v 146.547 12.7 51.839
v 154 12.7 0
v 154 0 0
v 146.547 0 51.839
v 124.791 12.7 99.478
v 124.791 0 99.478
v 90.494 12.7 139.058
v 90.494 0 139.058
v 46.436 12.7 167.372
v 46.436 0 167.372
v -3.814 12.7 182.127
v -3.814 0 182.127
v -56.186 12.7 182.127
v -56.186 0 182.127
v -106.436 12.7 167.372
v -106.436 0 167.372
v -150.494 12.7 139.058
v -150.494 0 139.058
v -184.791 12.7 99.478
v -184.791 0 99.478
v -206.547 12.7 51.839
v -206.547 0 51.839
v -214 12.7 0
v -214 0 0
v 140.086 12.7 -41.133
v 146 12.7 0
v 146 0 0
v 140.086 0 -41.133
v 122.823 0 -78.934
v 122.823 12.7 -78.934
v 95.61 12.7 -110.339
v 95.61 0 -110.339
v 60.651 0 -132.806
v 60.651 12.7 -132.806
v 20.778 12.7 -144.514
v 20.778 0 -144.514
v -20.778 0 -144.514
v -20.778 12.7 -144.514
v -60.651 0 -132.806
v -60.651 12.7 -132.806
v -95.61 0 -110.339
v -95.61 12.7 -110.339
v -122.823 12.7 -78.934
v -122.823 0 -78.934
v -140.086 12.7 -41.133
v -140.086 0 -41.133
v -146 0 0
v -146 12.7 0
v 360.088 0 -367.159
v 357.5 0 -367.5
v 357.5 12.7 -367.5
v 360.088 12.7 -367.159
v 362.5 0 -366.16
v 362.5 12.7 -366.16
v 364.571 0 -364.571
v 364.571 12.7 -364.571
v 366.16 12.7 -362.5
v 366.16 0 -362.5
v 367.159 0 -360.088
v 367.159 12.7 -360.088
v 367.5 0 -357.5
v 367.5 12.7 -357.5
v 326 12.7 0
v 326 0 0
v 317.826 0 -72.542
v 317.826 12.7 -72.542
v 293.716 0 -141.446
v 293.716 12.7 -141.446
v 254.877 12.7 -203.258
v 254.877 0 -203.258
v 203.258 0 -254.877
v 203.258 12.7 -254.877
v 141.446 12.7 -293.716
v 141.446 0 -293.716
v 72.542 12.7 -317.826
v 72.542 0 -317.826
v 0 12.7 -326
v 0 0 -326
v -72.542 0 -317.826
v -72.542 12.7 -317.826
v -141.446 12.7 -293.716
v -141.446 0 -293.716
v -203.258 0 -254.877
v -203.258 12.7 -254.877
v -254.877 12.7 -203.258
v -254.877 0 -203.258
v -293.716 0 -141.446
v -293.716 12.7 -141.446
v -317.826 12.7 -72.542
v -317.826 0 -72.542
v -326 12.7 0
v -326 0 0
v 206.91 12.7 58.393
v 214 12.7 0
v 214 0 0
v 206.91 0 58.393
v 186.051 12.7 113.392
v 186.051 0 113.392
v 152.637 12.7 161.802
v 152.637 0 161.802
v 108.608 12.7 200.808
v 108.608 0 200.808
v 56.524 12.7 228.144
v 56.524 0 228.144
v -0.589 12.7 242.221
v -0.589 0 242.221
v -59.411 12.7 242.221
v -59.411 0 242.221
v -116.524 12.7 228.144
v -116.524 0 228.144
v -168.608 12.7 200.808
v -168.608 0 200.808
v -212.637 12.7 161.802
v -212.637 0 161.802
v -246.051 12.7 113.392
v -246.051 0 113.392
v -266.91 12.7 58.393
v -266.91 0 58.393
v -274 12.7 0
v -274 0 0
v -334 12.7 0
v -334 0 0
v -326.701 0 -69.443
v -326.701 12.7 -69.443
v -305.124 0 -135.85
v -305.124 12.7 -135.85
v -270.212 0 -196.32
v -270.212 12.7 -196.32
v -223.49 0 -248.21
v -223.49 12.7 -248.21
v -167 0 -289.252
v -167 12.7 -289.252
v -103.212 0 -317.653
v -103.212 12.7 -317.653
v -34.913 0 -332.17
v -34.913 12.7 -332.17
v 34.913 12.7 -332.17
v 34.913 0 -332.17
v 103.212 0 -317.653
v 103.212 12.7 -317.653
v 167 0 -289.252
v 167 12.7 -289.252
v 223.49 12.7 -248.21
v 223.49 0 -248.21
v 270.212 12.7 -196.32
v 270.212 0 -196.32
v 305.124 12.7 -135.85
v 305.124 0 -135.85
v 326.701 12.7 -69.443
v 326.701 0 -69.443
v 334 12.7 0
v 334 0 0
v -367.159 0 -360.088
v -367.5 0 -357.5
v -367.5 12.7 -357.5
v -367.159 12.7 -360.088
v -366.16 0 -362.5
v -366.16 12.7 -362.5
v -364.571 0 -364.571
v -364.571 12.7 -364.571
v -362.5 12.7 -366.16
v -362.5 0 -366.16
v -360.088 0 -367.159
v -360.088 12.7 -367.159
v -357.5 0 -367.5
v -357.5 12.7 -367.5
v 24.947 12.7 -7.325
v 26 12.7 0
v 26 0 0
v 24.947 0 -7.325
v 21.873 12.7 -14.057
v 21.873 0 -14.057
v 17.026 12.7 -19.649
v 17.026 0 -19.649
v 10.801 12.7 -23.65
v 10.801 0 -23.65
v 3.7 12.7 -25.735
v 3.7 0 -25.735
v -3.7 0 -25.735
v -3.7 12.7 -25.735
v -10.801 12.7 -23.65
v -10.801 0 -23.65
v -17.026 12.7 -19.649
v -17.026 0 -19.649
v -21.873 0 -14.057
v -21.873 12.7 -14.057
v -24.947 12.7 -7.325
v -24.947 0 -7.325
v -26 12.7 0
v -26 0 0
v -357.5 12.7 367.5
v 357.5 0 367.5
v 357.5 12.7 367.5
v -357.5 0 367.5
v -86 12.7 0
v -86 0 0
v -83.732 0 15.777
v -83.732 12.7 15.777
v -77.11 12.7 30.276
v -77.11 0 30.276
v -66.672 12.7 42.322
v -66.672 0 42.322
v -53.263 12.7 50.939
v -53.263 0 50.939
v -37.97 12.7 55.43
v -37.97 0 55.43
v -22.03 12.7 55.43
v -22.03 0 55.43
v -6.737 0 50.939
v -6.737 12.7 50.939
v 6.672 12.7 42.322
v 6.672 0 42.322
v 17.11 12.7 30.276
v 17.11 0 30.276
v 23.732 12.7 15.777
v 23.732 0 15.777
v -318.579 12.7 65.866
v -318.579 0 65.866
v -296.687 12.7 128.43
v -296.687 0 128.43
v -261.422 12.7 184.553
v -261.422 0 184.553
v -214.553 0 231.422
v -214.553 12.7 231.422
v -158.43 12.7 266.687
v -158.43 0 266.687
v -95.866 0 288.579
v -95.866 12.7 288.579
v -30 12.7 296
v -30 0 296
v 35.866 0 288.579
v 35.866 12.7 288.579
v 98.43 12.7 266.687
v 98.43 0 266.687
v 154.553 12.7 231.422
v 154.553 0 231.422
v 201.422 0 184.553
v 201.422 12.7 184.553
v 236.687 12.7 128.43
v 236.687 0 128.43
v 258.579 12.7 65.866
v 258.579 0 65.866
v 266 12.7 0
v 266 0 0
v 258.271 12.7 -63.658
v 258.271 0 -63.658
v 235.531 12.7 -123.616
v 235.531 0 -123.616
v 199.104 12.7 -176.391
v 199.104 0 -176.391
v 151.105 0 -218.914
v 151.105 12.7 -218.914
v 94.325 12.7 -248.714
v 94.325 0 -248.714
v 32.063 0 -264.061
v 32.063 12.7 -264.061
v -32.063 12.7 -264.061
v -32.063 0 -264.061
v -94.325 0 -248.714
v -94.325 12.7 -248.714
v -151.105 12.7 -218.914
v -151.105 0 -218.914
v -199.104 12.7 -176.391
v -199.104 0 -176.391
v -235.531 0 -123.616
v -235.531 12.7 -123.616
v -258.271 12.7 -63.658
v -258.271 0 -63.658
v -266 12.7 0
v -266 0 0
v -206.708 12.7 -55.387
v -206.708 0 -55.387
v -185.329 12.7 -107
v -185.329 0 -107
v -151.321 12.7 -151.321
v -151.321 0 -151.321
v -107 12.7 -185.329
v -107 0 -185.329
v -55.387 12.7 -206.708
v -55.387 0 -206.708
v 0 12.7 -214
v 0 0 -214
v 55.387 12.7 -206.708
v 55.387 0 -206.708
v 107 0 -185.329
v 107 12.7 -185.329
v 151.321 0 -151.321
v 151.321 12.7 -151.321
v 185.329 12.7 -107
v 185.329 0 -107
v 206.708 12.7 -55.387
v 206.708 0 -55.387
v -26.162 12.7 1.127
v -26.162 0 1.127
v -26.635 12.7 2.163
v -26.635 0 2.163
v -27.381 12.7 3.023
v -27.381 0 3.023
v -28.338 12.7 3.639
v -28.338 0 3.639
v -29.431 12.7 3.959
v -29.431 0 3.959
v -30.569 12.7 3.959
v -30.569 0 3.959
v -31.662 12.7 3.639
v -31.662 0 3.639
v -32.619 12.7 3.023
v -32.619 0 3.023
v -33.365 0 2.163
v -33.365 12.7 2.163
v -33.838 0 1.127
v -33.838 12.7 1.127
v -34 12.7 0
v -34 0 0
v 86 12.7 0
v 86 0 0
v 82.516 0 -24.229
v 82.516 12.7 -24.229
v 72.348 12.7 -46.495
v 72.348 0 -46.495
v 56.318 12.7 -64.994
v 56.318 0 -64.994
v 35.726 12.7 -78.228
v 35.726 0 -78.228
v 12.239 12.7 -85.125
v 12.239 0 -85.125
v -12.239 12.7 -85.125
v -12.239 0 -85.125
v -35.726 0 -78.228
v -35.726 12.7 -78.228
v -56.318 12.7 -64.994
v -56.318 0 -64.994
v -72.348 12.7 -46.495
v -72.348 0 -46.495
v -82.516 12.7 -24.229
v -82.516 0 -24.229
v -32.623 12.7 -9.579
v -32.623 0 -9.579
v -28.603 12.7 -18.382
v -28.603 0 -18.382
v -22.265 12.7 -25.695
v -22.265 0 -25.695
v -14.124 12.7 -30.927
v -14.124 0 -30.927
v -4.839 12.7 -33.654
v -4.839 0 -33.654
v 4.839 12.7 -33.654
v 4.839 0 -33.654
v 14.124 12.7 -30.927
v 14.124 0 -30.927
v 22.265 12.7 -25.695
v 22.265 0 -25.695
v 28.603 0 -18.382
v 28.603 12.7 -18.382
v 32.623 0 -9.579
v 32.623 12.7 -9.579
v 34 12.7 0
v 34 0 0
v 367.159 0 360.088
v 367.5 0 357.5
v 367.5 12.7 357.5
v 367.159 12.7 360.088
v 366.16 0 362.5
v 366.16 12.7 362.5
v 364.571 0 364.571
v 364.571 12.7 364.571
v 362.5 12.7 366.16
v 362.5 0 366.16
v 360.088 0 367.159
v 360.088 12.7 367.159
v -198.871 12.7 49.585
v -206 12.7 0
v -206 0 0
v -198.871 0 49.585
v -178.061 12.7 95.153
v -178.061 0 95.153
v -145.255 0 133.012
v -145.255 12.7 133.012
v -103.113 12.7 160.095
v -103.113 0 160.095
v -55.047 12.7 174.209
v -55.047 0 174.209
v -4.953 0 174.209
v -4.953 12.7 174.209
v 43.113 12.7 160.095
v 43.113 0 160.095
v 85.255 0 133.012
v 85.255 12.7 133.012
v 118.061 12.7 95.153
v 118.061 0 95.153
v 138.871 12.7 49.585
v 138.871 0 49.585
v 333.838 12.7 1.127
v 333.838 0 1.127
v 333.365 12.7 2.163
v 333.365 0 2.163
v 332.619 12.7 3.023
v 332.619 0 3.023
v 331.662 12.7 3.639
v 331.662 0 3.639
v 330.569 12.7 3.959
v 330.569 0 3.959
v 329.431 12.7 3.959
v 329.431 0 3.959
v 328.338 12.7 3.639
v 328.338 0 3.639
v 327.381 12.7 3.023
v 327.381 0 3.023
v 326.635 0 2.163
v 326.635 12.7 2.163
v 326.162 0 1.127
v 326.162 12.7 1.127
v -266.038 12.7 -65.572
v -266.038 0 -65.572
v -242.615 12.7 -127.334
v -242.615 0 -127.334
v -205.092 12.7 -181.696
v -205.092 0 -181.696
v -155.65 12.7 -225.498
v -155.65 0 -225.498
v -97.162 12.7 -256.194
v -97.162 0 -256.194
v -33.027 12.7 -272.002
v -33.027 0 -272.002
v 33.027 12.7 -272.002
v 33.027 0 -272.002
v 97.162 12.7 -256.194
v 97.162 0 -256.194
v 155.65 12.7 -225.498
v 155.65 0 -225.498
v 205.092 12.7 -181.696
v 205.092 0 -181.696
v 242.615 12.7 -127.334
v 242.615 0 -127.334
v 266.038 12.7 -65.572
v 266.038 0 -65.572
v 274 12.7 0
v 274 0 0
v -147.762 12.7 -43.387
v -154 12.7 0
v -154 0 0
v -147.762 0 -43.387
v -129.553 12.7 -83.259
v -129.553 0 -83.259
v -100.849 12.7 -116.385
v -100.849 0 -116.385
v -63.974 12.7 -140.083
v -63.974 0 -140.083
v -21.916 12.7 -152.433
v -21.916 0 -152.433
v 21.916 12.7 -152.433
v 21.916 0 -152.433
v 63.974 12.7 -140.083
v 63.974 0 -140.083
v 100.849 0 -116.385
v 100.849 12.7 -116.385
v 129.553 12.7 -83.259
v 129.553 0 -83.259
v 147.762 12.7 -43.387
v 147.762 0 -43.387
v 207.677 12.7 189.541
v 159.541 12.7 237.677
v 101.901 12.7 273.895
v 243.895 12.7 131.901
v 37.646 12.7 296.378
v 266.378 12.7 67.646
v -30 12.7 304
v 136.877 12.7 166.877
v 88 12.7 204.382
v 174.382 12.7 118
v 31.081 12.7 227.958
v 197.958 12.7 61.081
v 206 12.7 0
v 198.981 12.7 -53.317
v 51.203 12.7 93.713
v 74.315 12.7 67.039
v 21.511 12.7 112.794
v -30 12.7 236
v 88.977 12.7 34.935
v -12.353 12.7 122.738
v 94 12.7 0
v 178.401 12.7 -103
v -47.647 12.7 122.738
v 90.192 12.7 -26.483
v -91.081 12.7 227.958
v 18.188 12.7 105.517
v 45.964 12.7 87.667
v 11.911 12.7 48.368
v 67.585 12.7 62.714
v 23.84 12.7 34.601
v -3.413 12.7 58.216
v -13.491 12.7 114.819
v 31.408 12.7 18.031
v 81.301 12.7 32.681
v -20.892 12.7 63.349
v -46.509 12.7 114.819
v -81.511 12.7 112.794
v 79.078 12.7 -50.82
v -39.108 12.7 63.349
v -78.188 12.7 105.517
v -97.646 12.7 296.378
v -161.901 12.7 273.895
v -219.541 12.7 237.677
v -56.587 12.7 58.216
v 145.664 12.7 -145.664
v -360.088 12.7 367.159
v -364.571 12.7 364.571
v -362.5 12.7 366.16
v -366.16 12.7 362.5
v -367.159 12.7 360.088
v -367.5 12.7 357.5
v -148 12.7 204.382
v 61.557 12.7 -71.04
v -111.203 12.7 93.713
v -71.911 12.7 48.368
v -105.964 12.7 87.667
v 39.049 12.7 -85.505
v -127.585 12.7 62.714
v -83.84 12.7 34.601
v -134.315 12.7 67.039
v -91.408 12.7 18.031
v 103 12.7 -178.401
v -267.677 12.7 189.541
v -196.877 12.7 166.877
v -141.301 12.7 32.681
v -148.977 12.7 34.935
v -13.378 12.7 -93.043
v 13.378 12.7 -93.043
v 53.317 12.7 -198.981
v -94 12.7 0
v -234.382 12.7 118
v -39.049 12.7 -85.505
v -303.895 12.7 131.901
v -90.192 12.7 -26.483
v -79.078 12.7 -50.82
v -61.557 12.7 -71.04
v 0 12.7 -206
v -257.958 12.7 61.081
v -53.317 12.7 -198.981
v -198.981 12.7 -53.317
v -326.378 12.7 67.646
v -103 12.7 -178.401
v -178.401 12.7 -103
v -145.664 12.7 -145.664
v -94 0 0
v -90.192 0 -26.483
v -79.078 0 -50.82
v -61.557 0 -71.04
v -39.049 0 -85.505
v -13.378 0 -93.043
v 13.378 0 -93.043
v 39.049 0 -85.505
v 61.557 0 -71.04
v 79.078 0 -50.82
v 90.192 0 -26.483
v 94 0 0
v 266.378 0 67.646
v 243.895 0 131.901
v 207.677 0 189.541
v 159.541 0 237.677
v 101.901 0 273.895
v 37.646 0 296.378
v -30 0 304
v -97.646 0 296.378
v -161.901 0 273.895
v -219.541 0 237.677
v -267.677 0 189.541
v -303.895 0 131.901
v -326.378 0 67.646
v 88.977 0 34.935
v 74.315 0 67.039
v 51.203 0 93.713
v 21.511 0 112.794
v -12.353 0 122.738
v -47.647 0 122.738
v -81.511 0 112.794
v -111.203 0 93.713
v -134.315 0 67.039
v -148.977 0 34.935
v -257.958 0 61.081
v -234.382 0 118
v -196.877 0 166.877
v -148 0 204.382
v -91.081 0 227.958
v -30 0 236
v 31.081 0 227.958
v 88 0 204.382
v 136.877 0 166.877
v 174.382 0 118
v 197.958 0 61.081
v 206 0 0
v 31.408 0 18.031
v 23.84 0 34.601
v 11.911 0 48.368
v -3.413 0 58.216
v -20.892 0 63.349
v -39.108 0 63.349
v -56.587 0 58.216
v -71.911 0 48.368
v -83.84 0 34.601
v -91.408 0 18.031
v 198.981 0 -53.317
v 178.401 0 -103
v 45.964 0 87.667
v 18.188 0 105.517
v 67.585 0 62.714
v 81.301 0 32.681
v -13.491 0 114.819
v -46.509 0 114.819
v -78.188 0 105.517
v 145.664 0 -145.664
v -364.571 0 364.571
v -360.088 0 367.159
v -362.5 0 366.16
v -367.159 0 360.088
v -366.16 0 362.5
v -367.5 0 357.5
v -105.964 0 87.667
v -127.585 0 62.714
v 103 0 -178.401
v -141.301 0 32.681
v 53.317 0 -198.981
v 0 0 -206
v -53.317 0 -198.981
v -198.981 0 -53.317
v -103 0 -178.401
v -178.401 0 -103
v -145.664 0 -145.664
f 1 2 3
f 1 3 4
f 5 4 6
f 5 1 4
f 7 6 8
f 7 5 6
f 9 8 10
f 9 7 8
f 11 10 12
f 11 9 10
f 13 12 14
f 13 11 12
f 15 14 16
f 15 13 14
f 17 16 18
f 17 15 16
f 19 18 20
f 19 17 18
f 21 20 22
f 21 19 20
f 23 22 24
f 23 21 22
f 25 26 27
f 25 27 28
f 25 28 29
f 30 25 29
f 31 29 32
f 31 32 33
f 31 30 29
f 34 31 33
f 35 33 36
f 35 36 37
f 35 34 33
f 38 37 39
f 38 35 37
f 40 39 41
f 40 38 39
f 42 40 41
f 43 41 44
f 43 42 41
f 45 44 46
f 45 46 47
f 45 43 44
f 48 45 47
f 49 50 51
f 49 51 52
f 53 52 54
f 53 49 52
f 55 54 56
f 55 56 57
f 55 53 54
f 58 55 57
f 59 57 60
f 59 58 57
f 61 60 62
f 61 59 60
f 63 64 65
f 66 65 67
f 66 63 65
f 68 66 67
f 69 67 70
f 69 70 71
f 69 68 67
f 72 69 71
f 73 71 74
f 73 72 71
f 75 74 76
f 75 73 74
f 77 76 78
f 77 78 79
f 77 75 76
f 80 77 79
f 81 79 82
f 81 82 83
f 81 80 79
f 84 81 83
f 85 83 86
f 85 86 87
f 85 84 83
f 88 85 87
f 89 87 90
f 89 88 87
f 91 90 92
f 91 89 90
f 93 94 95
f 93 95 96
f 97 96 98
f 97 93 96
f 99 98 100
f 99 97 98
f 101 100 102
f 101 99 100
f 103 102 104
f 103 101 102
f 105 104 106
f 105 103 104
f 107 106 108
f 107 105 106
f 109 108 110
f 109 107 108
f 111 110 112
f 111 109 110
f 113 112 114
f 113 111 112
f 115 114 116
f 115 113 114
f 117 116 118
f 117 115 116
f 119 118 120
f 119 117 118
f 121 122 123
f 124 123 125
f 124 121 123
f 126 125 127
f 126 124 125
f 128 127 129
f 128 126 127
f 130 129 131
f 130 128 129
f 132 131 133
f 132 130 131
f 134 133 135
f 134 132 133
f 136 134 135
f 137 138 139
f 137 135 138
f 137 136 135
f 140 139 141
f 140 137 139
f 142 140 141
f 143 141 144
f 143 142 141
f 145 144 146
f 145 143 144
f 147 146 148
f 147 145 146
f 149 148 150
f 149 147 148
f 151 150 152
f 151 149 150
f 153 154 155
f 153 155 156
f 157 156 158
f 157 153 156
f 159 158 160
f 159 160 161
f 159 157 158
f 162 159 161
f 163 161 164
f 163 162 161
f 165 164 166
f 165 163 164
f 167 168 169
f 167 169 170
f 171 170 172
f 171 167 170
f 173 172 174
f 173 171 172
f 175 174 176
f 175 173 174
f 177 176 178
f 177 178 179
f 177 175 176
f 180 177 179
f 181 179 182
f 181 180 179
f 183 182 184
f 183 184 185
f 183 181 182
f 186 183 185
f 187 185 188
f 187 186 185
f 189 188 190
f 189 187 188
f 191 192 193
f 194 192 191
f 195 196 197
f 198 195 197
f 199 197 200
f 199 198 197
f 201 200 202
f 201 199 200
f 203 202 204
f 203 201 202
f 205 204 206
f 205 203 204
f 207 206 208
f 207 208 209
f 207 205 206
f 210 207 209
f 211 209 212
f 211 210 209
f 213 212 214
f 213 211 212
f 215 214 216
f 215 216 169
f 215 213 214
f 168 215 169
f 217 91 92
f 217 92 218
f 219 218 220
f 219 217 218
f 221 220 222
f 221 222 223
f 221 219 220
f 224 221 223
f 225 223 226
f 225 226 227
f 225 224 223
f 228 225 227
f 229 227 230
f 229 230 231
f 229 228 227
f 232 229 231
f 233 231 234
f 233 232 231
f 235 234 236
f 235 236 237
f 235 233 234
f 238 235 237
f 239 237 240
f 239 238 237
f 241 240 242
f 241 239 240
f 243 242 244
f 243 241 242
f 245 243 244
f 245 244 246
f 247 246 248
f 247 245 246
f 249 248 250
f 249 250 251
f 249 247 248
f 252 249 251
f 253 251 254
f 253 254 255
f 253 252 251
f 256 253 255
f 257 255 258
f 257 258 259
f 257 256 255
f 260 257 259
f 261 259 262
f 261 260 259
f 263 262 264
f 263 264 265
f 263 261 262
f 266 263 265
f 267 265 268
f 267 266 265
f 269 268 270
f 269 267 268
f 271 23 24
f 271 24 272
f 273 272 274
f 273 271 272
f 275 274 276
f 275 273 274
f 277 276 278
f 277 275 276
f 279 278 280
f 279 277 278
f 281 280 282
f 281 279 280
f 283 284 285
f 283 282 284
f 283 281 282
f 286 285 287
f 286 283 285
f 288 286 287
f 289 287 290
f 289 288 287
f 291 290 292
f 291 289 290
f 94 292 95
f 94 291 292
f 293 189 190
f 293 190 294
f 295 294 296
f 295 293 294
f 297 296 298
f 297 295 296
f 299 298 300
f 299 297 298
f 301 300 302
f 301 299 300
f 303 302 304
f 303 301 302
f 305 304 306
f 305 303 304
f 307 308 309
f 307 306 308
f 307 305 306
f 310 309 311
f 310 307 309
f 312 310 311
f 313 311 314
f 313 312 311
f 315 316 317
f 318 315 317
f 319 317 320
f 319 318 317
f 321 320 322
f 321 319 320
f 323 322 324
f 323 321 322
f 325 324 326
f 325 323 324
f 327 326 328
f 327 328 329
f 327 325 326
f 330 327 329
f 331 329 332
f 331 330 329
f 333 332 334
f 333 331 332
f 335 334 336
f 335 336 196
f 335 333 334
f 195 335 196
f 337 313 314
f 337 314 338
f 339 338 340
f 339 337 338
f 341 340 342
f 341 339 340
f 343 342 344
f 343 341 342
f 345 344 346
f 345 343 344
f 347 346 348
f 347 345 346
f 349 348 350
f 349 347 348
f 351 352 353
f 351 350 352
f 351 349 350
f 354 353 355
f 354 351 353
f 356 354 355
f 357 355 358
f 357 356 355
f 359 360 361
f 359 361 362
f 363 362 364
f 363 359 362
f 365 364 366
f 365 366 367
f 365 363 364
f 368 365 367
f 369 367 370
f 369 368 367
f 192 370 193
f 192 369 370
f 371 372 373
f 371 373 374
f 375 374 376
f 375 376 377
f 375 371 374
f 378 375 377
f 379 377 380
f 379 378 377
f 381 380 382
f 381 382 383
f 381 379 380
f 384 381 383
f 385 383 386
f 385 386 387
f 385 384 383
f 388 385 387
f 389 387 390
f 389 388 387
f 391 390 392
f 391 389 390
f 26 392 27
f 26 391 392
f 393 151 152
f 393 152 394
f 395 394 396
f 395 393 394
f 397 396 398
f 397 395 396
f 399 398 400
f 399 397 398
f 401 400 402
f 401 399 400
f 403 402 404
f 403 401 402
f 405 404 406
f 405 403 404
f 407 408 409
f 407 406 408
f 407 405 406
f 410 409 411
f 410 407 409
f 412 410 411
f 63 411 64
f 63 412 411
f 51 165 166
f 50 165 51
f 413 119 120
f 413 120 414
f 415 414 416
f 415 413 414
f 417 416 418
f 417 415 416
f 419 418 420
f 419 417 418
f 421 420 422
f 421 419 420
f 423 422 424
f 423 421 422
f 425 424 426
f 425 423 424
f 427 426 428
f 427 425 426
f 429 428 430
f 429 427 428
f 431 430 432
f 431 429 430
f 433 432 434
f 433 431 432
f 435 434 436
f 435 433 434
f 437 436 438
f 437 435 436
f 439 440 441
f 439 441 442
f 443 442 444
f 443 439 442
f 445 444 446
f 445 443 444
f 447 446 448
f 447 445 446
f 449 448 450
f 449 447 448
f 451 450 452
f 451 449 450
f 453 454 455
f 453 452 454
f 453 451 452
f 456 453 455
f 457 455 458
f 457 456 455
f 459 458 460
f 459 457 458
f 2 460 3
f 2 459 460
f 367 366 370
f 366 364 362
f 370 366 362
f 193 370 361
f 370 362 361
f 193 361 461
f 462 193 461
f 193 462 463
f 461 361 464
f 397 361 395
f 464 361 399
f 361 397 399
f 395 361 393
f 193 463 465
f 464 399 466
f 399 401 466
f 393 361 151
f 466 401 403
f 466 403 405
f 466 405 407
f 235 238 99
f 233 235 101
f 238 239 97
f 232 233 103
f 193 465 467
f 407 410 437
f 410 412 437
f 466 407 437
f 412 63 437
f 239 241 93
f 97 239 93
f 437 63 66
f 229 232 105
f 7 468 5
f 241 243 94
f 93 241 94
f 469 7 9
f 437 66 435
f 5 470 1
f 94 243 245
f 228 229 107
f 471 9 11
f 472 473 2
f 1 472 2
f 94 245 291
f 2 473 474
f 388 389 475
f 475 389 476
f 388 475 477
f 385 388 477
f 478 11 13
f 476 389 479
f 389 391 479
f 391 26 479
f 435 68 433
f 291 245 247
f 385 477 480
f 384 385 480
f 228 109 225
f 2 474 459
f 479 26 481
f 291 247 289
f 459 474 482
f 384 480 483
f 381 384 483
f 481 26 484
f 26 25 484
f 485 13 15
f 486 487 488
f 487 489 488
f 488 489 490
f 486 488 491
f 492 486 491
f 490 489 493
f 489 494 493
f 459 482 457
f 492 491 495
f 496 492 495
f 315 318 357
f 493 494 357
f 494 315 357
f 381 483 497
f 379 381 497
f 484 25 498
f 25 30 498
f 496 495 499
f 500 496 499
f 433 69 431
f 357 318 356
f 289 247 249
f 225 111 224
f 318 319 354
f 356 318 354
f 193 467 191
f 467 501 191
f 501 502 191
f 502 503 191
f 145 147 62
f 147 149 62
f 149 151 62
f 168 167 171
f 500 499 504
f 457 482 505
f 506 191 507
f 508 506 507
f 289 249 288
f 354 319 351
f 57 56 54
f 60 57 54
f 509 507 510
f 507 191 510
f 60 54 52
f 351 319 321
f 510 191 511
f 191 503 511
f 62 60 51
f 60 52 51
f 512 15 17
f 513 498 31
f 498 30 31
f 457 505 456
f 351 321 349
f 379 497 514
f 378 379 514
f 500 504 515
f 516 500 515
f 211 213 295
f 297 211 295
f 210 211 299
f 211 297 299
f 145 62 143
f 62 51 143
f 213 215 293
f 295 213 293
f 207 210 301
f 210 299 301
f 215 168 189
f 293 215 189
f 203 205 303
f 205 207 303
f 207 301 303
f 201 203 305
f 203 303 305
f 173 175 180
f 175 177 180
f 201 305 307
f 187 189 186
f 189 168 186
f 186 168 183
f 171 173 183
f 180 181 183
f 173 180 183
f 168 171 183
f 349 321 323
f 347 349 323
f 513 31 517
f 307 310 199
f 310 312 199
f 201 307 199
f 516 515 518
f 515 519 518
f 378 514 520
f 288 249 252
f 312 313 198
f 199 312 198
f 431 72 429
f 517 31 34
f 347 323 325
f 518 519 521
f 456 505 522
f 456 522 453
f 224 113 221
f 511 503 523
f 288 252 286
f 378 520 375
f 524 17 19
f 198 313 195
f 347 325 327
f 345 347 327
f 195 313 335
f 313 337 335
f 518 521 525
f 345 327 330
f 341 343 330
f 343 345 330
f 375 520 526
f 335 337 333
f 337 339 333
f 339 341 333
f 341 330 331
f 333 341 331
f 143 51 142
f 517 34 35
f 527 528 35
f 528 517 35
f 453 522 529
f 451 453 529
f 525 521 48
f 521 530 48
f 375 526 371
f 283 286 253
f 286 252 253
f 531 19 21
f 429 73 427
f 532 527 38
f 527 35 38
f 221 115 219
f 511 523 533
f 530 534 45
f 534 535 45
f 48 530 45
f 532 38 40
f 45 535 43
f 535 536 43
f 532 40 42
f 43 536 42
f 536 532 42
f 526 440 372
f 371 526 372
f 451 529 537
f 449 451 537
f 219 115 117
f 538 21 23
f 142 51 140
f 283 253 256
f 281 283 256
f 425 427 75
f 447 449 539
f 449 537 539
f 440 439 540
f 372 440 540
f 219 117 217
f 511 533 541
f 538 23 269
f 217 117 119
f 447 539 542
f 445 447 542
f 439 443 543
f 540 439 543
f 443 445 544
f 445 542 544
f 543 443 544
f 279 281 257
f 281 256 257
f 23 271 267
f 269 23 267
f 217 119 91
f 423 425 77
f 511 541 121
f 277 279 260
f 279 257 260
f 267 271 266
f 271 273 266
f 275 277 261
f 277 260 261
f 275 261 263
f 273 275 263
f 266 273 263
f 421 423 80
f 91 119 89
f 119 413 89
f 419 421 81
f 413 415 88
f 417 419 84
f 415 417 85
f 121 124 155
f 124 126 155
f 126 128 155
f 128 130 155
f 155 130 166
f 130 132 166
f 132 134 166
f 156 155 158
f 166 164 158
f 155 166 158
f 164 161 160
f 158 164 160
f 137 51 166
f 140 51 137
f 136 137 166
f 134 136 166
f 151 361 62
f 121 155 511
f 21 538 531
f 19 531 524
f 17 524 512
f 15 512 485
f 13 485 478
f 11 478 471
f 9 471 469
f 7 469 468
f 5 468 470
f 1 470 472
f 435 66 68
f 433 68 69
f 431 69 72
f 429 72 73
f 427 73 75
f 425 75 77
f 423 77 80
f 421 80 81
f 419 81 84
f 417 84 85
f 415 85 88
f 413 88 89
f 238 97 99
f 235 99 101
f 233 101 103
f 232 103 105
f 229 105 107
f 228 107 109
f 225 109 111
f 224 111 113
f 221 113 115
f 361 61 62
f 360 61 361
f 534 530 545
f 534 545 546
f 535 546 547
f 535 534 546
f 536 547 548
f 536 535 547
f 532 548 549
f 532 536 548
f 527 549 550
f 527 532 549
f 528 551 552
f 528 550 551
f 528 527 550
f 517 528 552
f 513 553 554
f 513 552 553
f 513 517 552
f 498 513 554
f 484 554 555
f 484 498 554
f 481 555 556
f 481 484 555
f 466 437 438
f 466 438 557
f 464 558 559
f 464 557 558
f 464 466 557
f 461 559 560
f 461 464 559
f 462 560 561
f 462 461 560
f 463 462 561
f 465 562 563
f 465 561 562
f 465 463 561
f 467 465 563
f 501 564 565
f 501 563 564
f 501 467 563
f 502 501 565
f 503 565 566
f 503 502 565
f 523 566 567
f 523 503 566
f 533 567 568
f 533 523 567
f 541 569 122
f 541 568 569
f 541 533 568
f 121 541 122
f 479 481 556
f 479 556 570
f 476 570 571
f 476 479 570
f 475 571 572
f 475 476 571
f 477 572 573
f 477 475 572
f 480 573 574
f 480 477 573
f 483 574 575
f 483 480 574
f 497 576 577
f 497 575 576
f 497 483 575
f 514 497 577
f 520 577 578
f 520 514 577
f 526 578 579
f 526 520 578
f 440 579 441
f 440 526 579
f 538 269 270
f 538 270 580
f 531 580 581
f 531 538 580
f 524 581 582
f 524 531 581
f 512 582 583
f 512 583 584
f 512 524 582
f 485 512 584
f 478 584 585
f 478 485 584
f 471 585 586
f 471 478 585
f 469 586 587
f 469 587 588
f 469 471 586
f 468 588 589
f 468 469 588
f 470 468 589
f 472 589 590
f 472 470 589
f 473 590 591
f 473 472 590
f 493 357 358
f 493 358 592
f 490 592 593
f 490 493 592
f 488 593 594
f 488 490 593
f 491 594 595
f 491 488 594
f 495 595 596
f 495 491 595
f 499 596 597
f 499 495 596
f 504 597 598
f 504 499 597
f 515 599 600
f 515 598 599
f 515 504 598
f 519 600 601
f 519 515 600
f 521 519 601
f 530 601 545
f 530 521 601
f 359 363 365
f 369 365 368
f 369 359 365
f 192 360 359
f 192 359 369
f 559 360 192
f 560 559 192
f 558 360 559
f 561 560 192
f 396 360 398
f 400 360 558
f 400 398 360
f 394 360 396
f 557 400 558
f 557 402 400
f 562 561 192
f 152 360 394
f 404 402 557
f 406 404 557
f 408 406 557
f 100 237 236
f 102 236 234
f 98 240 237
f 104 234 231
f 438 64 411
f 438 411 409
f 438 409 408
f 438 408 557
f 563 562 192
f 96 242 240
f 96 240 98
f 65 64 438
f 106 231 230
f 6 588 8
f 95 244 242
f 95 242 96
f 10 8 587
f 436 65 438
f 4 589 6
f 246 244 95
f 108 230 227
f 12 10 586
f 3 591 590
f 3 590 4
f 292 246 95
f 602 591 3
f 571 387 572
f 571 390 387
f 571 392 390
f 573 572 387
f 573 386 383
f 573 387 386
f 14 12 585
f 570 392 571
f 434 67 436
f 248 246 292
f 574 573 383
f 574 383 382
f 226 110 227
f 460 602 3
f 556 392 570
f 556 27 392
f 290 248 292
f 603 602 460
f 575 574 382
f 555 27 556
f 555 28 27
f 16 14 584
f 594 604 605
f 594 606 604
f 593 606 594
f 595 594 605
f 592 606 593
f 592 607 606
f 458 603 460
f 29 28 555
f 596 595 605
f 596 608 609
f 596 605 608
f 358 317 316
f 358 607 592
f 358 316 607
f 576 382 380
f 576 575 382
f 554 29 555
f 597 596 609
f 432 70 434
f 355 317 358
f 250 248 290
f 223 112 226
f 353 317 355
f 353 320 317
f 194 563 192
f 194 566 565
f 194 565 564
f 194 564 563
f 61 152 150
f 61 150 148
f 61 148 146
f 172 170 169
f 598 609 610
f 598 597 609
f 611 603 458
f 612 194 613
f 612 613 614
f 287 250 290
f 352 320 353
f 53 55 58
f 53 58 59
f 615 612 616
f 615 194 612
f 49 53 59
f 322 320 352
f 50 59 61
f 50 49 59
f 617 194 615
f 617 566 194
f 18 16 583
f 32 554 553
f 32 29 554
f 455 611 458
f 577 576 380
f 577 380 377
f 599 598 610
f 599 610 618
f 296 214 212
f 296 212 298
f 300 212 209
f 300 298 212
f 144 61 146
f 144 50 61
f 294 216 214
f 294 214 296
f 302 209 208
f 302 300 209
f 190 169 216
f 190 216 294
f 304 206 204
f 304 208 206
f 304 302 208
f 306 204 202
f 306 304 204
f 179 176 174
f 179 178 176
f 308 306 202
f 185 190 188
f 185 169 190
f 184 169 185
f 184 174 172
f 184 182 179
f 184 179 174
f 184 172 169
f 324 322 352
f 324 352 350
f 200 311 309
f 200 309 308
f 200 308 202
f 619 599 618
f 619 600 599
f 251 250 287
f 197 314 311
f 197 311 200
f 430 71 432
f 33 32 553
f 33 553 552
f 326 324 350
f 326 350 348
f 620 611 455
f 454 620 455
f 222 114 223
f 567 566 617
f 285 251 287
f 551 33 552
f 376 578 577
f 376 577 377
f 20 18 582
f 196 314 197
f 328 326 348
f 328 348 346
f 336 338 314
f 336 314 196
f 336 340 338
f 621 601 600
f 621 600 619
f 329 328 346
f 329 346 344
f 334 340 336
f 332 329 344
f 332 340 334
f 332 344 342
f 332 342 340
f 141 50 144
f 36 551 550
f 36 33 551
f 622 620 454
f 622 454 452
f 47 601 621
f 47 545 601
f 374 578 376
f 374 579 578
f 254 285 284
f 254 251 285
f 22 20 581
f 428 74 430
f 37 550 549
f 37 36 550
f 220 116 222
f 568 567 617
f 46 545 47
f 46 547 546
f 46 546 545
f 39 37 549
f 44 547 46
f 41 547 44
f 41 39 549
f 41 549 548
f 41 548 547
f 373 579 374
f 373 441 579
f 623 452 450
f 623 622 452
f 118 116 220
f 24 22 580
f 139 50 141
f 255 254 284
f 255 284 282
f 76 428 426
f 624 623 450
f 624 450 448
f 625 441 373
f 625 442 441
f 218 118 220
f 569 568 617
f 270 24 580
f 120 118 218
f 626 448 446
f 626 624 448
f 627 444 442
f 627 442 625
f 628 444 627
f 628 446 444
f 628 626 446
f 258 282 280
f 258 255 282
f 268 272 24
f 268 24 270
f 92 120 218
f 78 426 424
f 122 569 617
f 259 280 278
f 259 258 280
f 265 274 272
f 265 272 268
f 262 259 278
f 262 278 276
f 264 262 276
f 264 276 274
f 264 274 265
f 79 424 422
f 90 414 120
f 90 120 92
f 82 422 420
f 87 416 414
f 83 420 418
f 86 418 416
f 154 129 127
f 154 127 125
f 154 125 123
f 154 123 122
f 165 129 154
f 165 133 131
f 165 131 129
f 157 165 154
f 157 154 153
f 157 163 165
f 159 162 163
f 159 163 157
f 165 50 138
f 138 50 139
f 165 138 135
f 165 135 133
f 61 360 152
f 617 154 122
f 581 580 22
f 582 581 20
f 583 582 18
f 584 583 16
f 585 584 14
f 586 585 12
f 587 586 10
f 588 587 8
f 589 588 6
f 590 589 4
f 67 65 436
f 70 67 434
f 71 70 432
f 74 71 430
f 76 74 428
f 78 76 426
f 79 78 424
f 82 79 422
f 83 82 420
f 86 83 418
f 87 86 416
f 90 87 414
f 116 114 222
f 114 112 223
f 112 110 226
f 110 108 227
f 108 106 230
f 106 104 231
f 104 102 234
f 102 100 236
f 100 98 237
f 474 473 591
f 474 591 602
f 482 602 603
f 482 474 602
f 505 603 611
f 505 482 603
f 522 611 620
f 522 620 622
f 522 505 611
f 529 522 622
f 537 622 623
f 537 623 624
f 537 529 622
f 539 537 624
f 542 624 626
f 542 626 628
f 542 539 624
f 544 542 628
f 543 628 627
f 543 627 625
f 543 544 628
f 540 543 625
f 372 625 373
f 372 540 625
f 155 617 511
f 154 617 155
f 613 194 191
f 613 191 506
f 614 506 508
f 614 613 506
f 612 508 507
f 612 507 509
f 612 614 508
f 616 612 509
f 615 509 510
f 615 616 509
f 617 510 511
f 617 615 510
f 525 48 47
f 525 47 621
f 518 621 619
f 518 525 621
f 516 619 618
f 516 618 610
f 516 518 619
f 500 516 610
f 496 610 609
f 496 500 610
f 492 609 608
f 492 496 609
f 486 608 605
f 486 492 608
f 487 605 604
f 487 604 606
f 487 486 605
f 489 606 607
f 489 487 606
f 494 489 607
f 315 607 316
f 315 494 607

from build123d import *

# Parameters (mm, degrees)
BOSS_EXTRU_1_DEPTH      = 12.7
ENL_V_MAT_EXTRU_1_DEPTH = 13.7


with BuildPart() as part:
    # Esquisse1 → Boss.-Extru.1 (new body)
    with BuildSketch(Plane(origin=(0, 0, 0), x_dir=(1, 0, 0), z_dir=(0, 1, 0))):
        with BuildLine():
            Line((-357.5, 367.5), (357.5, 367.5))
            ThreePointArc((357.5, 367.5), (364.571067812, 364.571067812), (367.5, 357.5))
            Line((367.5, 357.5), (367.5, -357.5))
            ThreePointArc((367.5, -357.5), (364.571067812, -364.571067812), (357.5, -367.5))
            Line((357.5, -367.5), (-357.5, -367.5))
            ThreePointArc((-357.5, -367.5), (-364.571067812, -364.571067812), (-367.5, -357.5))
            Line((-367.5, -357.5), (-367.5, 357.5))
            ThreePointArc((-367.5, 357.5), (-364.571067812, 364.571067812), (-357.5, 367.5))
        make_face()
    extrude(amount=BOSS_EXTRU_1_DEPTH)

    # Esquisse2 → Enlèv. mat.-Extru.1 (cut, through all)
    with BuildSketch(Plane(origin=(0, 12.7, 0), x_dir=(1, 0, 0), z_dir=(0, 1, 0))):
        with BuildLine():
            ThreePointArc((26, 0), (0, 26), (-26, 0))
            ThreePointArc((-26, 0), (-30, -4), (-34, 0))
            ThreePointArc((-34, 0), (0, 34), (34, 0))
            ThreePointArc((34, 0), (-30, -64), (-94, 0))
            ThreePointArc((-94, 0), (0, 94), (94, 0))
            ThreePointArc((94, 0), (-30, -124), (-154, 0))
            ThreePointArc((-154, 0), (0, 154), (154, 0))
            ThreePointArc((154, 0), (-30, -184), (-214, 0))
            ThreePointArc((-214, 0), (0, 214), (214, 0))
            ThreePointArc((214, 0), (-30, -244), (-274, 0))
            ThreePointArc((-274, 0), (0, 274), (274, 0))
            ThreePointArc((274, 0), (-30, -304), (-334, 0))
            ThreePointArc((-334, 0), (0, 334), (334, 0))
            ThreePointArc((334, 0), (330, -4), (326, 0))
            ThreePointArc((326, 0), (0, 326), (-326, 0))
            ThreePointArc((-326, 0), (-30, -296), (266, 0))
            ThreePointArc((266, 0), (0, 266), (-266, 0))
            ThreePointArc((-266, 0), (-30, -236), (206, 0))
            ThreePointArc((206, 0), (0, 206), (-206, 0))
            ThreePointArc((-206, 0), (-30, -176), (146, 0))
            ThreePointArc((146, 0), (0, 146), (-146, 0))
            ThreePointArc((-146, 0), (-30, -116), (86, 0))
            ThreePointArc((86, 0), (0, 86), (-86, 0))
            ThreePointArc((-86, 0), (-30, -56), (26, 0))
        make_face()
    extrude(amount=-ENL_V_MAT_EXTRU_1_DEPTH, mode=Mode.SUBTRACT)


solid = part.part
